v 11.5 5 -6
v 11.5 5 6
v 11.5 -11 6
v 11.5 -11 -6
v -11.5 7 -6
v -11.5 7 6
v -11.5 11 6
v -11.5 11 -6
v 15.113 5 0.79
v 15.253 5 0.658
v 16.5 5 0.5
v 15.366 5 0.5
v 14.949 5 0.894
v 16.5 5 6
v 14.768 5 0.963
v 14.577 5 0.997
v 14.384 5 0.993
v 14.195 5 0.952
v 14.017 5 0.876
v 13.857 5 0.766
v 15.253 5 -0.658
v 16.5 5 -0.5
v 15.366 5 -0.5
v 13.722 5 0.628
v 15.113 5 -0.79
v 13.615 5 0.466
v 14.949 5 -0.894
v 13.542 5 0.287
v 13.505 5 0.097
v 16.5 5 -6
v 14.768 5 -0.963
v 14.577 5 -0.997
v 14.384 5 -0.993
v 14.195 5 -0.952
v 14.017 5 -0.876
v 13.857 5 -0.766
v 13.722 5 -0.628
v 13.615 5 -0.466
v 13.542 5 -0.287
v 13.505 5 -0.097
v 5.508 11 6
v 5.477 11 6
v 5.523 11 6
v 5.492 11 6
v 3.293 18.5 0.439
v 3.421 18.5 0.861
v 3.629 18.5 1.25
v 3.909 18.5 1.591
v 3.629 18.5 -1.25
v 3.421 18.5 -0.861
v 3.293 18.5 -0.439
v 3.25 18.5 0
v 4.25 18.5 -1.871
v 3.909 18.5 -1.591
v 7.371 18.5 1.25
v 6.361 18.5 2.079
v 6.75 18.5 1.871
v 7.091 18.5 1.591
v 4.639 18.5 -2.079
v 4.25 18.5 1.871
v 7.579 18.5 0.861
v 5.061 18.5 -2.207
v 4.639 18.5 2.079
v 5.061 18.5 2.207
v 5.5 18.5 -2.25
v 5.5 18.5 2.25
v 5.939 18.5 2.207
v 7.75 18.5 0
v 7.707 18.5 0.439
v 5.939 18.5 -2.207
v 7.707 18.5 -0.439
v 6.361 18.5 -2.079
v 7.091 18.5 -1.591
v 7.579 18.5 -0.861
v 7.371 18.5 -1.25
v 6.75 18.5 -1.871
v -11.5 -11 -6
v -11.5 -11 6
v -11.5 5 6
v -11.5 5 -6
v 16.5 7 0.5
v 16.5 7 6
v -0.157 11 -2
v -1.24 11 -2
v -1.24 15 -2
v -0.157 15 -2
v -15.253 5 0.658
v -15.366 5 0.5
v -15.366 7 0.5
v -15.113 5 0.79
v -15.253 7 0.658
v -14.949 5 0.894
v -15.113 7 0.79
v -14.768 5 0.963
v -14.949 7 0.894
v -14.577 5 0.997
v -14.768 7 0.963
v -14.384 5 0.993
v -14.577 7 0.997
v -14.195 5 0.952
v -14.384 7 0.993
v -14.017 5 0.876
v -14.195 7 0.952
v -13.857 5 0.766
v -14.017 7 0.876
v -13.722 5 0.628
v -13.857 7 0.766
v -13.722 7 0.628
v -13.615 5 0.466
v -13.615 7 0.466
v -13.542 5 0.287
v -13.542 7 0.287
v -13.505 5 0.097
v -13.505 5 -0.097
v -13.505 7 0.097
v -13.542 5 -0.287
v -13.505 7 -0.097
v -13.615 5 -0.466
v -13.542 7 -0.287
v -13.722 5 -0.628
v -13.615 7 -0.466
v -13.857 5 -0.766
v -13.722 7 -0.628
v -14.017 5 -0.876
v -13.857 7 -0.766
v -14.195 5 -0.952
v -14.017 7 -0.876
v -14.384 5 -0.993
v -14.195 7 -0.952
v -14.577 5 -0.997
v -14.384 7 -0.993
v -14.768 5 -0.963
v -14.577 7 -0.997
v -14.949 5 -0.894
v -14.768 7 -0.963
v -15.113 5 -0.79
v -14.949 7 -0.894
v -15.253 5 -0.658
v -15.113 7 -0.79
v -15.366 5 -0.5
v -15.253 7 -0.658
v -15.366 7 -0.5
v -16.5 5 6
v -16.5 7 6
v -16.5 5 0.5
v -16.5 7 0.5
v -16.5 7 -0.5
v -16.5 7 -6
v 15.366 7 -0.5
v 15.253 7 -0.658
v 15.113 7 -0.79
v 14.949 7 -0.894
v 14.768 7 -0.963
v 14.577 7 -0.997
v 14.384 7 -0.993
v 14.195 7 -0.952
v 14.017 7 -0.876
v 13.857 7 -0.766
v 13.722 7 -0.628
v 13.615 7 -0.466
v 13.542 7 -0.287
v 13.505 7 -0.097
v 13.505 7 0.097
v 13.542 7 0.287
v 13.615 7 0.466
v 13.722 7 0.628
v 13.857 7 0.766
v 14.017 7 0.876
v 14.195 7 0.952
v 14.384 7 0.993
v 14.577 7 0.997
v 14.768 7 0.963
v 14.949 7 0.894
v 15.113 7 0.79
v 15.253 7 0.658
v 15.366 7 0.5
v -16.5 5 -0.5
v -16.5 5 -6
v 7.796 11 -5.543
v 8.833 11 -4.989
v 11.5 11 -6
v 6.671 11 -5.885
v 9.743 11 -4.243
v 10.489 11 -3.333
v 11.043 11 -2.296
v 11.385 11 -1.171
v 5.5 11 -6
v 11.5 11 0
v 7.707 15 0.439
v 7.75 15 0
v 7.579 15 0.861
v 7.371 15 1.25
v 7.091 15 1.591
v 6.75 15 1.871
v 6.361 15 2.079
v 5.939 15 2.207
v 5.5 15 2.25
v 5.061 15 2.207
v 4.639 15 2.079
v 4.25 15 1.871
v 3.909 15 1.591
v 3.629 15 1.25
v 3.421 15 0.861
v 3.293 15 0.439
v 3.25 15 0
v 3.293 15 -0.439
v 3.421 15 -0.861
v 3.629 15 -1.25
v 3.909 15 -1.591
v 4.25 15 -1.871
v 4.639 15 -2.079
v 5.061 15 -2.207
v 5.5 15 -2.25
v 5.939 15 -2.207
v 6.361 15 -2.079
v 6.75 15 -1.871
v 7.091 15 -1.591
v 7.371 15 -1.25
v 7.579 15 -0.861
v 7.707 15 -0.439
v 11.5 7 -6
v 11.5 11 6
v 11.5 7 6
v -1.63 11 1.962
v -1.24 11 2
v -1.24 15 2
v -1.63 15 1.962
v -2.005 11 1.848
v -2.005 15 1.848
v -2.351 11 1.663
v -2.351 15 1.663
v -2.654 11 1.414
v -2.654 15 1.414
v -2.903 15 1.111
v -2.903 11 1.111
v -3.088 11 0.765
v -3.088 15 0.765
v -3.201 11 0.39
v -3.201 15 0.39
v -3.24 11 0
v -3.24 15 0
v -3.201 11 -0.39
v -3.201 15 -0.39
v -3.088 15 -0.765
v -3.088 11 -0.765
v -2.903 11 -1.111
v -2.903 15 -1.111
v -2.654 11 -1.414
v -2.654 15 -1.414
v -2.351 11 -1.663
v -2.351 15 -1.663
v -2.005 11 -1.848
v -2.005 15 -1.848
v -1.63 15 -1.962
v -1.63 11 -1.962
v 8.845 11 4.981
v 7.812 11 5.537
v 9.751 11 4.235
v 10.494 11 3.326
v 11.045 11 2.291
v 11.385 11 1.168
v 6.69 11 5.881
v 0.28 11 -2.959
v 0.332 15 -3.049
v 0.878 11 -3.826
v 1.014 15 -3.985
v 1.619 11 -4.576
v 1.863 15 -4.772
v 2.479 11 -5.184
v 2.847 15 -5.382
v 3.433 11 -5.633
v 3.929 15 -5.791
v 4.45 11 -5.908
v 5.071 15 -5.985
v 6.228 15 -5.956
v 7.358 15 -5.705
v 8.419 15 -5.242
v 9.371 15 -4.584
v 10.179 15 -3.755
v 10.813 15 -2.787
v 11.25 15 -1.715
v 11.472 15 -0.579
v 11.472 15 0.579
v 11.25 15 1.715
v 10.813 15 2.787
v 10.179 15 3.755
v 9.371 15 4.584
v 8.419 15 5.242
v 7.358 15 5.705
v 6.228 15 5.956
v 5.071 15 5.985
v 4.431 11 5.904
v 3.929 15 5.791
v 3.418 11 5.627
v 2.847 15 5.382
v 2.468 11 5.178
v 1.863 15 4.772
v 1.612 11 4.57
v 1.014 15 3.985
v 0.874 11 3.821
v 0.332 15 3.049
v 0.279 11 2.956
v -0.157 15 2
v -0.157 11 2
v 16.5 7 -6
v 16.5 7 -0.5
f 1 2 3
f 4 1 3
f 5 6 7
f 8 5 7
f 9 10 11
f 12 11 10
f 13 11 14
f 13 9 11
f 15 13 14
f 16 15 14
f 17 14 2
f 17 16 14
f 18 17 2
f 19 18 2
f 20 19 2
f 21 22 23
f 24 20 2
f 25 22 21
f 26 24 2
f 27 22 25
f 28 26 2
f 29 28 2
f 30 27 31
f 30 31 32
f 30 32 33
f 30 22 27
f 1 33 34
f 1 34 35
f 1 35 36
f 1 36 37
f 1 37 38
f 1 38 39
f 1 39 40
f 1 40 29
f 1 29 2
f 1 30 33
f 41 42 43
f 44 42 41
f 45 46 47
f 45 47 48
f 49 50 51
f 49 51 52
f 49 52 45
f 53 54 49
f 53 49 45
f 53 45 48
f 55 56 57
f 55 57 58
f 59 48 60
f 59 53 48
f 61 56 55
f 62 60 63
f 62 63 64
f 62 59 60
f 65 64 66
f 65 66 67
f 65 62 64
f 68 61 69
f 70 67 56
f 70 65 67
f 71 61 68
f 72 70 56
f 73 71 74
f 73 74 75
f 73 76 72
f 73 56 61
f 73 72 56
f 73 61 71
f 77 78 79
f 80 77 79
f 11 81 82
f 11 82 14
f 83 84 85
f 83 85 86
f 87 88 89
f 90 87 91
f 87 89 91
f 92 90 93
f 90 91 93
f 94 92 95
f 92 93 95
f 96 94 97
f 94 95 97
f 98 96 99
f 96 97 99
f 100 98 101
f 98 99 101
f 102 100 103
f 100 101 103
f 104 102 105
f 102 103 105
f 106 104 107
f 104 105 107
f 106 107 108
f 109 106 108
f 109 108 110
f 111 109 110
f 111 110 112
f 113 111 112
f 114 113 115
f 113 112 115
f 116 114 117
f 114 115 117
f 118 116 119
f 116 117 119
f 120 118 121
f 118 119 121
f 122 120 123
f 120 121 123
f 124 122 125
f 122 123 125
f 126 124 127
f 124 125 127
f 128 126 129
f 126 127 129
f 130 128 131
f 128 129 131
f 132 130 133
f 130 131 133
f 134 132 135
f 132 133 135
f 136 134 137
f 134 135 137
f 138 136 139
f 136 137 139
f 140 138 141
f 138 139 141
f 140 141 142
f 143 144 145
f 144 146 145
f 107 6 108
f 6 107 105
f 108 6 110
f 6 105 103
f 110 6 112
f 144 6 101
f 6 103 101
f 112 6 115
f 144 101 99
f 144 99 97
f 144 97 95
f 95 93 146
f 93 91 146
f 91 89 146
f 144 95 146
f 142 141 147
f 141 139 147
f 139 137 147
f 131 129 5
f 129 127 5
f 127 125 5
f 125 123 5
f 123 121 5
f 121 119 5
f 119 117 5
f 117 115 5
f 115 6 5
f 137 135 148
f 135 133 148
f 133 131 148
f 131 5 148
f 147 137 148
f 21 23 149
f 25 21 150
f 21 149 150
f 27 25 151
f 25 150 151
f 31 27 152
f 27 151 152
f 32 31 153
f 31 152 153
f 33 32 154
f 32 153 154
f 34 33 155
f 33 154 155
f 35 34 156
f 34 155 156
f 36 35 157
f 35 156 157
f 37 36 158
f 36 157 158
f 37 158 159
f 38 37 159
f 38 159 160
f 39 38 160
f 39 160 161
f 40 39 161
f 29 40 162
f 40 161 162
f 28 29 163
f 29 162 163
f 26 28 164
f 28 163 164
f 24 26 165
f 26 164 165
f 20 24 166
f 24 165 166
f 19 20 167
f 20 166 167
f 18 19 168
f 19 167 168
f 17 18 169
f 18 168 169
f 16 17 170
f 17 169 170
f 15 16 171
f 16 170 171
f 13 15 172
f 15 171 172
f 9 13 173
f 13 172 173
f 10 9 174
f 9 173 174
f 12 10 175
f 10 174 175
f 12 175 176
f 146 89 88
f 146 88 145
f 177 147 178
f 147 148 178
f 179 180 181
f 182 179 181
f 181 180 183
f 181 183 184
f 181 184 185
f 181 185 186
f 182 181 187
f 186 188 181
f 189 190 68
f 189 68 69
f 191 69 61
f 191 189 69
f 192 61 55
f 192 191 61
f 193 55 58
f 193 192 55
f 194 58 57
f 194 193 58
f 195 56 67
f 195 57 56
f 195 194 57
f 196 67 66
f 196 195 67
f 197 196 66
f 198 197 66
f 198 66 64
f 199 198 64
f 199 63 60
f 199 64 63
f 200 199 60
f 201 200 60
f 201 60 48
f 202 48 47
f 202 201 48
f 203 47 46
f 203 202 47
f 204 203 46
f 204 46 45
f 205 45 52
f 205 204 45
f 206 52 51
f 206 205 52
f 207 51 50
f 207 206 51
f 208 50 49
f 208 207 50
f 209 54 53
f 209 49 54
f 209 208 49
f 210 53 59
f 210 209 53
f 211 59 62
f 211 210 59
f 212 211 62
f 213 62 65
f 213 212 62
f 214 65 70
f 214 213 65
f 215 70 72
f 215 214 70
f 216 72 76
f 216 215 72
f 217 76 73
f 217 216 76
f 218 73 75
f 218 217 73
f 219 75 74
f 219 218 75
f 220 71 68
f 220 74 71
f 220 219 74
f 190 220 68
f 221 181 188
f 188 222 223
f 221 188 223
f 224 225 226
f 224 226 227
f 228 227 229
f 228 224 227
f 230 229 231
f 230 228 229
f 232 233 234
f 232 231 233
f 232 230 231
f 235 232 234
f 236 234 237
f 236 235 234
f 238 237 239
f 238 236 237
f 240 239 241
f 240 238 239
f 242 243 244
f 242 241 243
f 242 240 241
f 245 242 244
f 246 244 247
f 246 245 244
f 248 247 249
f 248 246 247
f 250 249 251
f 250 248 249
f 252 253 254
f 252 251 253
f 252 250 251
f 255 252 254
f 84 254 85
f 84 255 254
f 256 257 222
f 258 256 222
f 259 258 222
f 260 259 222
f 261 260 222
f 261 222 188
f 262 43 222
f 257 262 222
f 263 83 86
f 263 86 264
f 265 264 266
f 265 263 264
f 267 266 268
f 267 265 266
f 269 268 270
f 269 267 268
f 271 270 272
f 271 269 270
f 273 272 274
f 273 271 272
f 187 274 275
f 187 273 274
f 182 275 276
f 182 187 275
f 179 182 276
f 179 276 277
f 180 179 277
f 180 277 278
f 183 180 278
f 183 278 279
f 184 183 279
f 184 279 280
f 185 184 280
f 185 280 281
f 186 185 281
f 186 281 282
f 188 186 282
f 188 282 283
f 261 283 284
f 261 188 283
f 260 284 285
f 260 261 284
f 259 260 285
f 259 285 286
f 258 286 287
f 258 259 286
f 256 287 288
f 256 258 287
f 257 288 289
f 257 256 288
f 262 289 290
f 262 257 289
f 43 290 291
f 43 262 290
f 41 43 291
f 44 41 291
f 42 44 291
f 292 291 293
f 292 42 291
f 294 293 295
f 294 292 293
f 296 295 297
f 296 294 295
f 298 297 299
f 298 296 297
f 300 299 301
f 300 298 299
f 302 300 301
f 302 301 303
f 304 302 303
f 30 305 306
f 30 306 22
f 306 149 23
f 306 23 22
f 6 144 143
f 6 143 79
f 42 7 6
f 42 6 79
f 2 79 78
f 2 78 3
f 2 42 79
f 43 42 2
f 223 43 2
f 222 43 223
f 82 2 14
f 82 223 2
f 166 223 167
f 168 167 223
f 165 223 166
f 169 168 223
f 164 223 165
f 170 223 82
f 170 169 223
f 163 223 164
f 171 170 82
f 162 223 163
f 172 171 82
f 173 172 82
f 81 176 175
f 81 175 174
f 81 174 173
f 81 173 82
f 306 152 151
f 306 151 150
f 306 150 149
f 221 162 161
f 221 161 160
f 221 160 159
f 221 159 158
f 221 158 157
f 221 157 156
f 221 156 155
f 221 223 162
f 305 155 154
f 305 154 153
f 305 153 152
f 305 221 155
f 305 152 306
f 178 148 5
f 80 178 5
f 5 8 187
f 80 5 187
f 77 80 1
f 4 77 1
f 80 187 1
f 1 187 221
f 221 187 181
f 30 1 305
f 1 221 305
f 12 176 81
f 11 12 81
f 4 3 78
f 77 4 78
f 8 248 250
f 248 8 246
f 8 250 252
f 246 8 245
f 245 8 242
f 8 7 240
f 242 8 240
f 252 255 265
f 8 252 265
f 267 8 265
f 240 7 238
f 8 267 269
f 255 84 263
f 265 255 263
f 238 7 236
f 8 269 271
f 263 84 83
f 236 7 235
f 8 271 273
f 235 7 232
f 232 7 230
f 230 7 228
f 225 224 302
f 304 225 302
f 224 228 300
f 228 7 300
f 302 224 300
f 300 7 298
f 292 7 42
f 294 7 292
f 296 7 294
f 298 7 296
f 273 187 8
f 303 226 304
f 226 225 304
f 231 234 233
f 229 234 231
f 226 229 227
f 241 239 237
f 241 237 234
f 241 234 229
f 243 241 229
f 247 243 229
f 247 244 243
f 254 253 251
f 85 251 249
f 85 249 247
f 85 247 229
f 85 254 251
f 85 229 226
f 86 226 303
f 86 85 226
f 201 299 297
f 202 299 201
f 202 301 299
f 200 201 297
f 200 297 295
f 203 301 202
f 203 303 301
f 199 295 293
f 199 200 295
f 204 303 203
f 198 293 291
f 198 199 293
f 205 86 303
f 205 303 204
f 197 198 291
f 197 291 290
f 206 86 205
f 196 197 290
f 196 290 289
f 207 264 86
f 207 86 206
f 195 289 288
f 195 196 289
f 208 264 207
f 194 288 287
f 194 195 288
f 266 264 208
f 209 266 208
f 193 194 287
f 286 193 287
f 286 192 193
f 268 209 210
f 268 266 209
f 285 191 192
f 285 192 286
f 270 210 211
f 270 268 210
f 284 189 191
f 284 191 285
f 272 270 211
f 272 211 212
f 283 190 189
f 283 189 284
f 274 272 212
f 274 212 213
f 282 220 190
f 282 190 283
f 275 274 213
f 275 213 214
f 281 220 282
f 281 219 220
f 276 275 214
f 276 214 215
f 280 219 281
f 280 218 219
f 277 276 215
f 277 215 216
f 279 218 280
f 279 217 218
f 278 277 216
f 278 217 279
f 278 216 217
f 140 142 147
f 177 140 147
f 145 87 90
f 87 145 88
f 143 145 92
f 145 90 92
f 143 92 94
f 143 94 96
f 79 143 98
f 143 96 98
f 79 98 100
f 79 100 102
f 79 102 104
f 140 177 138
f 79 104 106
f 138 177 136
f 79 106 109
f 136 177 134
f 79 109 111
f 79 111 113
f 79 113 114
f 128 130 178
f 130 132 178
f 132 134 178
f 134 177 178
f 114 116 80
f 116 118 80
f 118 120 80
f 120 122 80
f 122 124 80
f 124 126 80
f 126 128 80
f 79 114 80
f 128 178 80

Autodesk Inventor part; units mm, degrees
ref_plane "YZ Plane" through (0, 0, 0) normal (1, 0, 0) x (0, 1, 0)
ref_plane "XZ Plane" through (0, 0, 0) normal (0, 1, 0) x (-1, 0, 0)
ref_plane "XY Plane" through (0, 0, 0) normal (0, 0, 1) x (1, 0, 0)
sketch "Skizze1" plane through (0, 0, 0) normal (0, 0, 1) x (1, 0, 0)
  line L0 (-11.5, 11) -> (11.5, 11)
  line L1 (11.5, 11) -> (11.5, -11)
  line L2 (11.5, -11) -> (-11.5, -11)
  line L3 (-11.5, -11) -> (-11.5, 11)
  line L4 (0, -15.4) -> (0, 15.4) projected
  line L5 (-23.1, 0) -> (23.1, 0) projected
  line L6 (-11.5, 7) -> (-16.5, 7)
  line L7 (-16.5, 7) -> (-16.5, 5)
  line L8 (-16.5, 5) -> (-11.5, 5)
  line L9 (-11.5, 5) -> (-11.5, 7)
  line L10 (11.5, 7) -> (16.5, 7)
  line L11 (16.5, 7) -> (16.5, 5)
  line L12 (16.5, 5) -> (11.5, 5)
  line L13 (11.5, 5) -> (11.5, 7)
  point P0 (0, 0)
  dimension "d0" = 23
  dimension "d1" = 22
  dimension "d2" = 16
  dimension "d3" = 2
  dimension "d4" = 5
extrude "Extrusion1" add sketch "Skizze1" against normal mid plane 12 contours L0 L4 L5 L3 | L0 L1 L5 L4 | L5 L1 L2 L4 | L4 L2 L3 L5
extrude "Extrusion2" add sketch "Skizze1" along normal mid plane 12 contours L3 L8 L7 L6 | L10 L11 L12 L1
sketch "Skizze2" plane through (-11.5, 11, -6) normal (0, 1, 0) x (1, 0, 0)
  arc A0 (11.3431, -8) -> (11.3431, -4) centre (17, -6) ccw
  line L0 (0, 0) -> (23, 0) projected
  line L1 (23, 0) -> (23, -12) projected
  arc A1 (10.2601, -4) -> (10.2601, -8) centre (10.2601, -6) ccw
  line L2 (10.2601, -4) -> (11.3431, -4)
  line L3 (10.2601, -8) -> (11.3431, -8)
  point P0 (11.5, -6)
  dimension "d9" = 6
  dimension "d10" = 6
  dimension "d11" = 4
extrude "Extrusion3" add sketch "Skizze2" along normal blind 4 contours L3 A1 L2 A0
sketch "Skizze3" plane through (-16.5, 7, 6) normal (0, 1, 0) x (1, 0, 0)
  arc A0 (1.134, 5.5) -> (1.134, 6.5) centre (2, 6) ccw
  line L0 (0, 12) -> (0, 0) projected
  arc A1 (31.866, 6.5) -> (31.866, 5.5) centre (31, 6) ccw
  line L1 (33, 0) -> (33, 12) projected
  line L2 (1.134, 6.5) -> (0, 6.5)
  line L3 (1.134, 5.5) -> (0, 5.5)
  line L4 (31.866, 6.5) -> (33, 6.5)
  line L5 (33, 12) -> (33, 0) projected
  line L6 (31.866, 5.5) -> (33, 5.5)
  line L7 (-6.6, 6) -> (39.6, 6) projected
  line L8 (0, 6.5) -> (0, 5.5)
  line L9 (33, 6.5) -> (33, 5.5)
  point P0 (16.5, 6)
  dimension "d14" = 2
  dimension "d15" = 2
  dimension "d16" = 2
  dimension "d17" = 2
  dimension "d18" = 1
extrude "Extrusion4" cut sketch "Skizze3" against normal blind 2
sketch "Skizze4" plane through (-11.5, 15, -6) normal (0, 1, 0) x (1, 0, 0)
  circle A0 centre (17, -6) radius 2.25
  line L0 (23, -6) -> (23, -12) projected
  point P0 (11.5, -6)
  dimension "d21" = 4.5
  dimension "d22" = 6
extrude "Extrusion5" add sketch "Skizze4" along normal blind 3.5
properties part number "MicroServo"
